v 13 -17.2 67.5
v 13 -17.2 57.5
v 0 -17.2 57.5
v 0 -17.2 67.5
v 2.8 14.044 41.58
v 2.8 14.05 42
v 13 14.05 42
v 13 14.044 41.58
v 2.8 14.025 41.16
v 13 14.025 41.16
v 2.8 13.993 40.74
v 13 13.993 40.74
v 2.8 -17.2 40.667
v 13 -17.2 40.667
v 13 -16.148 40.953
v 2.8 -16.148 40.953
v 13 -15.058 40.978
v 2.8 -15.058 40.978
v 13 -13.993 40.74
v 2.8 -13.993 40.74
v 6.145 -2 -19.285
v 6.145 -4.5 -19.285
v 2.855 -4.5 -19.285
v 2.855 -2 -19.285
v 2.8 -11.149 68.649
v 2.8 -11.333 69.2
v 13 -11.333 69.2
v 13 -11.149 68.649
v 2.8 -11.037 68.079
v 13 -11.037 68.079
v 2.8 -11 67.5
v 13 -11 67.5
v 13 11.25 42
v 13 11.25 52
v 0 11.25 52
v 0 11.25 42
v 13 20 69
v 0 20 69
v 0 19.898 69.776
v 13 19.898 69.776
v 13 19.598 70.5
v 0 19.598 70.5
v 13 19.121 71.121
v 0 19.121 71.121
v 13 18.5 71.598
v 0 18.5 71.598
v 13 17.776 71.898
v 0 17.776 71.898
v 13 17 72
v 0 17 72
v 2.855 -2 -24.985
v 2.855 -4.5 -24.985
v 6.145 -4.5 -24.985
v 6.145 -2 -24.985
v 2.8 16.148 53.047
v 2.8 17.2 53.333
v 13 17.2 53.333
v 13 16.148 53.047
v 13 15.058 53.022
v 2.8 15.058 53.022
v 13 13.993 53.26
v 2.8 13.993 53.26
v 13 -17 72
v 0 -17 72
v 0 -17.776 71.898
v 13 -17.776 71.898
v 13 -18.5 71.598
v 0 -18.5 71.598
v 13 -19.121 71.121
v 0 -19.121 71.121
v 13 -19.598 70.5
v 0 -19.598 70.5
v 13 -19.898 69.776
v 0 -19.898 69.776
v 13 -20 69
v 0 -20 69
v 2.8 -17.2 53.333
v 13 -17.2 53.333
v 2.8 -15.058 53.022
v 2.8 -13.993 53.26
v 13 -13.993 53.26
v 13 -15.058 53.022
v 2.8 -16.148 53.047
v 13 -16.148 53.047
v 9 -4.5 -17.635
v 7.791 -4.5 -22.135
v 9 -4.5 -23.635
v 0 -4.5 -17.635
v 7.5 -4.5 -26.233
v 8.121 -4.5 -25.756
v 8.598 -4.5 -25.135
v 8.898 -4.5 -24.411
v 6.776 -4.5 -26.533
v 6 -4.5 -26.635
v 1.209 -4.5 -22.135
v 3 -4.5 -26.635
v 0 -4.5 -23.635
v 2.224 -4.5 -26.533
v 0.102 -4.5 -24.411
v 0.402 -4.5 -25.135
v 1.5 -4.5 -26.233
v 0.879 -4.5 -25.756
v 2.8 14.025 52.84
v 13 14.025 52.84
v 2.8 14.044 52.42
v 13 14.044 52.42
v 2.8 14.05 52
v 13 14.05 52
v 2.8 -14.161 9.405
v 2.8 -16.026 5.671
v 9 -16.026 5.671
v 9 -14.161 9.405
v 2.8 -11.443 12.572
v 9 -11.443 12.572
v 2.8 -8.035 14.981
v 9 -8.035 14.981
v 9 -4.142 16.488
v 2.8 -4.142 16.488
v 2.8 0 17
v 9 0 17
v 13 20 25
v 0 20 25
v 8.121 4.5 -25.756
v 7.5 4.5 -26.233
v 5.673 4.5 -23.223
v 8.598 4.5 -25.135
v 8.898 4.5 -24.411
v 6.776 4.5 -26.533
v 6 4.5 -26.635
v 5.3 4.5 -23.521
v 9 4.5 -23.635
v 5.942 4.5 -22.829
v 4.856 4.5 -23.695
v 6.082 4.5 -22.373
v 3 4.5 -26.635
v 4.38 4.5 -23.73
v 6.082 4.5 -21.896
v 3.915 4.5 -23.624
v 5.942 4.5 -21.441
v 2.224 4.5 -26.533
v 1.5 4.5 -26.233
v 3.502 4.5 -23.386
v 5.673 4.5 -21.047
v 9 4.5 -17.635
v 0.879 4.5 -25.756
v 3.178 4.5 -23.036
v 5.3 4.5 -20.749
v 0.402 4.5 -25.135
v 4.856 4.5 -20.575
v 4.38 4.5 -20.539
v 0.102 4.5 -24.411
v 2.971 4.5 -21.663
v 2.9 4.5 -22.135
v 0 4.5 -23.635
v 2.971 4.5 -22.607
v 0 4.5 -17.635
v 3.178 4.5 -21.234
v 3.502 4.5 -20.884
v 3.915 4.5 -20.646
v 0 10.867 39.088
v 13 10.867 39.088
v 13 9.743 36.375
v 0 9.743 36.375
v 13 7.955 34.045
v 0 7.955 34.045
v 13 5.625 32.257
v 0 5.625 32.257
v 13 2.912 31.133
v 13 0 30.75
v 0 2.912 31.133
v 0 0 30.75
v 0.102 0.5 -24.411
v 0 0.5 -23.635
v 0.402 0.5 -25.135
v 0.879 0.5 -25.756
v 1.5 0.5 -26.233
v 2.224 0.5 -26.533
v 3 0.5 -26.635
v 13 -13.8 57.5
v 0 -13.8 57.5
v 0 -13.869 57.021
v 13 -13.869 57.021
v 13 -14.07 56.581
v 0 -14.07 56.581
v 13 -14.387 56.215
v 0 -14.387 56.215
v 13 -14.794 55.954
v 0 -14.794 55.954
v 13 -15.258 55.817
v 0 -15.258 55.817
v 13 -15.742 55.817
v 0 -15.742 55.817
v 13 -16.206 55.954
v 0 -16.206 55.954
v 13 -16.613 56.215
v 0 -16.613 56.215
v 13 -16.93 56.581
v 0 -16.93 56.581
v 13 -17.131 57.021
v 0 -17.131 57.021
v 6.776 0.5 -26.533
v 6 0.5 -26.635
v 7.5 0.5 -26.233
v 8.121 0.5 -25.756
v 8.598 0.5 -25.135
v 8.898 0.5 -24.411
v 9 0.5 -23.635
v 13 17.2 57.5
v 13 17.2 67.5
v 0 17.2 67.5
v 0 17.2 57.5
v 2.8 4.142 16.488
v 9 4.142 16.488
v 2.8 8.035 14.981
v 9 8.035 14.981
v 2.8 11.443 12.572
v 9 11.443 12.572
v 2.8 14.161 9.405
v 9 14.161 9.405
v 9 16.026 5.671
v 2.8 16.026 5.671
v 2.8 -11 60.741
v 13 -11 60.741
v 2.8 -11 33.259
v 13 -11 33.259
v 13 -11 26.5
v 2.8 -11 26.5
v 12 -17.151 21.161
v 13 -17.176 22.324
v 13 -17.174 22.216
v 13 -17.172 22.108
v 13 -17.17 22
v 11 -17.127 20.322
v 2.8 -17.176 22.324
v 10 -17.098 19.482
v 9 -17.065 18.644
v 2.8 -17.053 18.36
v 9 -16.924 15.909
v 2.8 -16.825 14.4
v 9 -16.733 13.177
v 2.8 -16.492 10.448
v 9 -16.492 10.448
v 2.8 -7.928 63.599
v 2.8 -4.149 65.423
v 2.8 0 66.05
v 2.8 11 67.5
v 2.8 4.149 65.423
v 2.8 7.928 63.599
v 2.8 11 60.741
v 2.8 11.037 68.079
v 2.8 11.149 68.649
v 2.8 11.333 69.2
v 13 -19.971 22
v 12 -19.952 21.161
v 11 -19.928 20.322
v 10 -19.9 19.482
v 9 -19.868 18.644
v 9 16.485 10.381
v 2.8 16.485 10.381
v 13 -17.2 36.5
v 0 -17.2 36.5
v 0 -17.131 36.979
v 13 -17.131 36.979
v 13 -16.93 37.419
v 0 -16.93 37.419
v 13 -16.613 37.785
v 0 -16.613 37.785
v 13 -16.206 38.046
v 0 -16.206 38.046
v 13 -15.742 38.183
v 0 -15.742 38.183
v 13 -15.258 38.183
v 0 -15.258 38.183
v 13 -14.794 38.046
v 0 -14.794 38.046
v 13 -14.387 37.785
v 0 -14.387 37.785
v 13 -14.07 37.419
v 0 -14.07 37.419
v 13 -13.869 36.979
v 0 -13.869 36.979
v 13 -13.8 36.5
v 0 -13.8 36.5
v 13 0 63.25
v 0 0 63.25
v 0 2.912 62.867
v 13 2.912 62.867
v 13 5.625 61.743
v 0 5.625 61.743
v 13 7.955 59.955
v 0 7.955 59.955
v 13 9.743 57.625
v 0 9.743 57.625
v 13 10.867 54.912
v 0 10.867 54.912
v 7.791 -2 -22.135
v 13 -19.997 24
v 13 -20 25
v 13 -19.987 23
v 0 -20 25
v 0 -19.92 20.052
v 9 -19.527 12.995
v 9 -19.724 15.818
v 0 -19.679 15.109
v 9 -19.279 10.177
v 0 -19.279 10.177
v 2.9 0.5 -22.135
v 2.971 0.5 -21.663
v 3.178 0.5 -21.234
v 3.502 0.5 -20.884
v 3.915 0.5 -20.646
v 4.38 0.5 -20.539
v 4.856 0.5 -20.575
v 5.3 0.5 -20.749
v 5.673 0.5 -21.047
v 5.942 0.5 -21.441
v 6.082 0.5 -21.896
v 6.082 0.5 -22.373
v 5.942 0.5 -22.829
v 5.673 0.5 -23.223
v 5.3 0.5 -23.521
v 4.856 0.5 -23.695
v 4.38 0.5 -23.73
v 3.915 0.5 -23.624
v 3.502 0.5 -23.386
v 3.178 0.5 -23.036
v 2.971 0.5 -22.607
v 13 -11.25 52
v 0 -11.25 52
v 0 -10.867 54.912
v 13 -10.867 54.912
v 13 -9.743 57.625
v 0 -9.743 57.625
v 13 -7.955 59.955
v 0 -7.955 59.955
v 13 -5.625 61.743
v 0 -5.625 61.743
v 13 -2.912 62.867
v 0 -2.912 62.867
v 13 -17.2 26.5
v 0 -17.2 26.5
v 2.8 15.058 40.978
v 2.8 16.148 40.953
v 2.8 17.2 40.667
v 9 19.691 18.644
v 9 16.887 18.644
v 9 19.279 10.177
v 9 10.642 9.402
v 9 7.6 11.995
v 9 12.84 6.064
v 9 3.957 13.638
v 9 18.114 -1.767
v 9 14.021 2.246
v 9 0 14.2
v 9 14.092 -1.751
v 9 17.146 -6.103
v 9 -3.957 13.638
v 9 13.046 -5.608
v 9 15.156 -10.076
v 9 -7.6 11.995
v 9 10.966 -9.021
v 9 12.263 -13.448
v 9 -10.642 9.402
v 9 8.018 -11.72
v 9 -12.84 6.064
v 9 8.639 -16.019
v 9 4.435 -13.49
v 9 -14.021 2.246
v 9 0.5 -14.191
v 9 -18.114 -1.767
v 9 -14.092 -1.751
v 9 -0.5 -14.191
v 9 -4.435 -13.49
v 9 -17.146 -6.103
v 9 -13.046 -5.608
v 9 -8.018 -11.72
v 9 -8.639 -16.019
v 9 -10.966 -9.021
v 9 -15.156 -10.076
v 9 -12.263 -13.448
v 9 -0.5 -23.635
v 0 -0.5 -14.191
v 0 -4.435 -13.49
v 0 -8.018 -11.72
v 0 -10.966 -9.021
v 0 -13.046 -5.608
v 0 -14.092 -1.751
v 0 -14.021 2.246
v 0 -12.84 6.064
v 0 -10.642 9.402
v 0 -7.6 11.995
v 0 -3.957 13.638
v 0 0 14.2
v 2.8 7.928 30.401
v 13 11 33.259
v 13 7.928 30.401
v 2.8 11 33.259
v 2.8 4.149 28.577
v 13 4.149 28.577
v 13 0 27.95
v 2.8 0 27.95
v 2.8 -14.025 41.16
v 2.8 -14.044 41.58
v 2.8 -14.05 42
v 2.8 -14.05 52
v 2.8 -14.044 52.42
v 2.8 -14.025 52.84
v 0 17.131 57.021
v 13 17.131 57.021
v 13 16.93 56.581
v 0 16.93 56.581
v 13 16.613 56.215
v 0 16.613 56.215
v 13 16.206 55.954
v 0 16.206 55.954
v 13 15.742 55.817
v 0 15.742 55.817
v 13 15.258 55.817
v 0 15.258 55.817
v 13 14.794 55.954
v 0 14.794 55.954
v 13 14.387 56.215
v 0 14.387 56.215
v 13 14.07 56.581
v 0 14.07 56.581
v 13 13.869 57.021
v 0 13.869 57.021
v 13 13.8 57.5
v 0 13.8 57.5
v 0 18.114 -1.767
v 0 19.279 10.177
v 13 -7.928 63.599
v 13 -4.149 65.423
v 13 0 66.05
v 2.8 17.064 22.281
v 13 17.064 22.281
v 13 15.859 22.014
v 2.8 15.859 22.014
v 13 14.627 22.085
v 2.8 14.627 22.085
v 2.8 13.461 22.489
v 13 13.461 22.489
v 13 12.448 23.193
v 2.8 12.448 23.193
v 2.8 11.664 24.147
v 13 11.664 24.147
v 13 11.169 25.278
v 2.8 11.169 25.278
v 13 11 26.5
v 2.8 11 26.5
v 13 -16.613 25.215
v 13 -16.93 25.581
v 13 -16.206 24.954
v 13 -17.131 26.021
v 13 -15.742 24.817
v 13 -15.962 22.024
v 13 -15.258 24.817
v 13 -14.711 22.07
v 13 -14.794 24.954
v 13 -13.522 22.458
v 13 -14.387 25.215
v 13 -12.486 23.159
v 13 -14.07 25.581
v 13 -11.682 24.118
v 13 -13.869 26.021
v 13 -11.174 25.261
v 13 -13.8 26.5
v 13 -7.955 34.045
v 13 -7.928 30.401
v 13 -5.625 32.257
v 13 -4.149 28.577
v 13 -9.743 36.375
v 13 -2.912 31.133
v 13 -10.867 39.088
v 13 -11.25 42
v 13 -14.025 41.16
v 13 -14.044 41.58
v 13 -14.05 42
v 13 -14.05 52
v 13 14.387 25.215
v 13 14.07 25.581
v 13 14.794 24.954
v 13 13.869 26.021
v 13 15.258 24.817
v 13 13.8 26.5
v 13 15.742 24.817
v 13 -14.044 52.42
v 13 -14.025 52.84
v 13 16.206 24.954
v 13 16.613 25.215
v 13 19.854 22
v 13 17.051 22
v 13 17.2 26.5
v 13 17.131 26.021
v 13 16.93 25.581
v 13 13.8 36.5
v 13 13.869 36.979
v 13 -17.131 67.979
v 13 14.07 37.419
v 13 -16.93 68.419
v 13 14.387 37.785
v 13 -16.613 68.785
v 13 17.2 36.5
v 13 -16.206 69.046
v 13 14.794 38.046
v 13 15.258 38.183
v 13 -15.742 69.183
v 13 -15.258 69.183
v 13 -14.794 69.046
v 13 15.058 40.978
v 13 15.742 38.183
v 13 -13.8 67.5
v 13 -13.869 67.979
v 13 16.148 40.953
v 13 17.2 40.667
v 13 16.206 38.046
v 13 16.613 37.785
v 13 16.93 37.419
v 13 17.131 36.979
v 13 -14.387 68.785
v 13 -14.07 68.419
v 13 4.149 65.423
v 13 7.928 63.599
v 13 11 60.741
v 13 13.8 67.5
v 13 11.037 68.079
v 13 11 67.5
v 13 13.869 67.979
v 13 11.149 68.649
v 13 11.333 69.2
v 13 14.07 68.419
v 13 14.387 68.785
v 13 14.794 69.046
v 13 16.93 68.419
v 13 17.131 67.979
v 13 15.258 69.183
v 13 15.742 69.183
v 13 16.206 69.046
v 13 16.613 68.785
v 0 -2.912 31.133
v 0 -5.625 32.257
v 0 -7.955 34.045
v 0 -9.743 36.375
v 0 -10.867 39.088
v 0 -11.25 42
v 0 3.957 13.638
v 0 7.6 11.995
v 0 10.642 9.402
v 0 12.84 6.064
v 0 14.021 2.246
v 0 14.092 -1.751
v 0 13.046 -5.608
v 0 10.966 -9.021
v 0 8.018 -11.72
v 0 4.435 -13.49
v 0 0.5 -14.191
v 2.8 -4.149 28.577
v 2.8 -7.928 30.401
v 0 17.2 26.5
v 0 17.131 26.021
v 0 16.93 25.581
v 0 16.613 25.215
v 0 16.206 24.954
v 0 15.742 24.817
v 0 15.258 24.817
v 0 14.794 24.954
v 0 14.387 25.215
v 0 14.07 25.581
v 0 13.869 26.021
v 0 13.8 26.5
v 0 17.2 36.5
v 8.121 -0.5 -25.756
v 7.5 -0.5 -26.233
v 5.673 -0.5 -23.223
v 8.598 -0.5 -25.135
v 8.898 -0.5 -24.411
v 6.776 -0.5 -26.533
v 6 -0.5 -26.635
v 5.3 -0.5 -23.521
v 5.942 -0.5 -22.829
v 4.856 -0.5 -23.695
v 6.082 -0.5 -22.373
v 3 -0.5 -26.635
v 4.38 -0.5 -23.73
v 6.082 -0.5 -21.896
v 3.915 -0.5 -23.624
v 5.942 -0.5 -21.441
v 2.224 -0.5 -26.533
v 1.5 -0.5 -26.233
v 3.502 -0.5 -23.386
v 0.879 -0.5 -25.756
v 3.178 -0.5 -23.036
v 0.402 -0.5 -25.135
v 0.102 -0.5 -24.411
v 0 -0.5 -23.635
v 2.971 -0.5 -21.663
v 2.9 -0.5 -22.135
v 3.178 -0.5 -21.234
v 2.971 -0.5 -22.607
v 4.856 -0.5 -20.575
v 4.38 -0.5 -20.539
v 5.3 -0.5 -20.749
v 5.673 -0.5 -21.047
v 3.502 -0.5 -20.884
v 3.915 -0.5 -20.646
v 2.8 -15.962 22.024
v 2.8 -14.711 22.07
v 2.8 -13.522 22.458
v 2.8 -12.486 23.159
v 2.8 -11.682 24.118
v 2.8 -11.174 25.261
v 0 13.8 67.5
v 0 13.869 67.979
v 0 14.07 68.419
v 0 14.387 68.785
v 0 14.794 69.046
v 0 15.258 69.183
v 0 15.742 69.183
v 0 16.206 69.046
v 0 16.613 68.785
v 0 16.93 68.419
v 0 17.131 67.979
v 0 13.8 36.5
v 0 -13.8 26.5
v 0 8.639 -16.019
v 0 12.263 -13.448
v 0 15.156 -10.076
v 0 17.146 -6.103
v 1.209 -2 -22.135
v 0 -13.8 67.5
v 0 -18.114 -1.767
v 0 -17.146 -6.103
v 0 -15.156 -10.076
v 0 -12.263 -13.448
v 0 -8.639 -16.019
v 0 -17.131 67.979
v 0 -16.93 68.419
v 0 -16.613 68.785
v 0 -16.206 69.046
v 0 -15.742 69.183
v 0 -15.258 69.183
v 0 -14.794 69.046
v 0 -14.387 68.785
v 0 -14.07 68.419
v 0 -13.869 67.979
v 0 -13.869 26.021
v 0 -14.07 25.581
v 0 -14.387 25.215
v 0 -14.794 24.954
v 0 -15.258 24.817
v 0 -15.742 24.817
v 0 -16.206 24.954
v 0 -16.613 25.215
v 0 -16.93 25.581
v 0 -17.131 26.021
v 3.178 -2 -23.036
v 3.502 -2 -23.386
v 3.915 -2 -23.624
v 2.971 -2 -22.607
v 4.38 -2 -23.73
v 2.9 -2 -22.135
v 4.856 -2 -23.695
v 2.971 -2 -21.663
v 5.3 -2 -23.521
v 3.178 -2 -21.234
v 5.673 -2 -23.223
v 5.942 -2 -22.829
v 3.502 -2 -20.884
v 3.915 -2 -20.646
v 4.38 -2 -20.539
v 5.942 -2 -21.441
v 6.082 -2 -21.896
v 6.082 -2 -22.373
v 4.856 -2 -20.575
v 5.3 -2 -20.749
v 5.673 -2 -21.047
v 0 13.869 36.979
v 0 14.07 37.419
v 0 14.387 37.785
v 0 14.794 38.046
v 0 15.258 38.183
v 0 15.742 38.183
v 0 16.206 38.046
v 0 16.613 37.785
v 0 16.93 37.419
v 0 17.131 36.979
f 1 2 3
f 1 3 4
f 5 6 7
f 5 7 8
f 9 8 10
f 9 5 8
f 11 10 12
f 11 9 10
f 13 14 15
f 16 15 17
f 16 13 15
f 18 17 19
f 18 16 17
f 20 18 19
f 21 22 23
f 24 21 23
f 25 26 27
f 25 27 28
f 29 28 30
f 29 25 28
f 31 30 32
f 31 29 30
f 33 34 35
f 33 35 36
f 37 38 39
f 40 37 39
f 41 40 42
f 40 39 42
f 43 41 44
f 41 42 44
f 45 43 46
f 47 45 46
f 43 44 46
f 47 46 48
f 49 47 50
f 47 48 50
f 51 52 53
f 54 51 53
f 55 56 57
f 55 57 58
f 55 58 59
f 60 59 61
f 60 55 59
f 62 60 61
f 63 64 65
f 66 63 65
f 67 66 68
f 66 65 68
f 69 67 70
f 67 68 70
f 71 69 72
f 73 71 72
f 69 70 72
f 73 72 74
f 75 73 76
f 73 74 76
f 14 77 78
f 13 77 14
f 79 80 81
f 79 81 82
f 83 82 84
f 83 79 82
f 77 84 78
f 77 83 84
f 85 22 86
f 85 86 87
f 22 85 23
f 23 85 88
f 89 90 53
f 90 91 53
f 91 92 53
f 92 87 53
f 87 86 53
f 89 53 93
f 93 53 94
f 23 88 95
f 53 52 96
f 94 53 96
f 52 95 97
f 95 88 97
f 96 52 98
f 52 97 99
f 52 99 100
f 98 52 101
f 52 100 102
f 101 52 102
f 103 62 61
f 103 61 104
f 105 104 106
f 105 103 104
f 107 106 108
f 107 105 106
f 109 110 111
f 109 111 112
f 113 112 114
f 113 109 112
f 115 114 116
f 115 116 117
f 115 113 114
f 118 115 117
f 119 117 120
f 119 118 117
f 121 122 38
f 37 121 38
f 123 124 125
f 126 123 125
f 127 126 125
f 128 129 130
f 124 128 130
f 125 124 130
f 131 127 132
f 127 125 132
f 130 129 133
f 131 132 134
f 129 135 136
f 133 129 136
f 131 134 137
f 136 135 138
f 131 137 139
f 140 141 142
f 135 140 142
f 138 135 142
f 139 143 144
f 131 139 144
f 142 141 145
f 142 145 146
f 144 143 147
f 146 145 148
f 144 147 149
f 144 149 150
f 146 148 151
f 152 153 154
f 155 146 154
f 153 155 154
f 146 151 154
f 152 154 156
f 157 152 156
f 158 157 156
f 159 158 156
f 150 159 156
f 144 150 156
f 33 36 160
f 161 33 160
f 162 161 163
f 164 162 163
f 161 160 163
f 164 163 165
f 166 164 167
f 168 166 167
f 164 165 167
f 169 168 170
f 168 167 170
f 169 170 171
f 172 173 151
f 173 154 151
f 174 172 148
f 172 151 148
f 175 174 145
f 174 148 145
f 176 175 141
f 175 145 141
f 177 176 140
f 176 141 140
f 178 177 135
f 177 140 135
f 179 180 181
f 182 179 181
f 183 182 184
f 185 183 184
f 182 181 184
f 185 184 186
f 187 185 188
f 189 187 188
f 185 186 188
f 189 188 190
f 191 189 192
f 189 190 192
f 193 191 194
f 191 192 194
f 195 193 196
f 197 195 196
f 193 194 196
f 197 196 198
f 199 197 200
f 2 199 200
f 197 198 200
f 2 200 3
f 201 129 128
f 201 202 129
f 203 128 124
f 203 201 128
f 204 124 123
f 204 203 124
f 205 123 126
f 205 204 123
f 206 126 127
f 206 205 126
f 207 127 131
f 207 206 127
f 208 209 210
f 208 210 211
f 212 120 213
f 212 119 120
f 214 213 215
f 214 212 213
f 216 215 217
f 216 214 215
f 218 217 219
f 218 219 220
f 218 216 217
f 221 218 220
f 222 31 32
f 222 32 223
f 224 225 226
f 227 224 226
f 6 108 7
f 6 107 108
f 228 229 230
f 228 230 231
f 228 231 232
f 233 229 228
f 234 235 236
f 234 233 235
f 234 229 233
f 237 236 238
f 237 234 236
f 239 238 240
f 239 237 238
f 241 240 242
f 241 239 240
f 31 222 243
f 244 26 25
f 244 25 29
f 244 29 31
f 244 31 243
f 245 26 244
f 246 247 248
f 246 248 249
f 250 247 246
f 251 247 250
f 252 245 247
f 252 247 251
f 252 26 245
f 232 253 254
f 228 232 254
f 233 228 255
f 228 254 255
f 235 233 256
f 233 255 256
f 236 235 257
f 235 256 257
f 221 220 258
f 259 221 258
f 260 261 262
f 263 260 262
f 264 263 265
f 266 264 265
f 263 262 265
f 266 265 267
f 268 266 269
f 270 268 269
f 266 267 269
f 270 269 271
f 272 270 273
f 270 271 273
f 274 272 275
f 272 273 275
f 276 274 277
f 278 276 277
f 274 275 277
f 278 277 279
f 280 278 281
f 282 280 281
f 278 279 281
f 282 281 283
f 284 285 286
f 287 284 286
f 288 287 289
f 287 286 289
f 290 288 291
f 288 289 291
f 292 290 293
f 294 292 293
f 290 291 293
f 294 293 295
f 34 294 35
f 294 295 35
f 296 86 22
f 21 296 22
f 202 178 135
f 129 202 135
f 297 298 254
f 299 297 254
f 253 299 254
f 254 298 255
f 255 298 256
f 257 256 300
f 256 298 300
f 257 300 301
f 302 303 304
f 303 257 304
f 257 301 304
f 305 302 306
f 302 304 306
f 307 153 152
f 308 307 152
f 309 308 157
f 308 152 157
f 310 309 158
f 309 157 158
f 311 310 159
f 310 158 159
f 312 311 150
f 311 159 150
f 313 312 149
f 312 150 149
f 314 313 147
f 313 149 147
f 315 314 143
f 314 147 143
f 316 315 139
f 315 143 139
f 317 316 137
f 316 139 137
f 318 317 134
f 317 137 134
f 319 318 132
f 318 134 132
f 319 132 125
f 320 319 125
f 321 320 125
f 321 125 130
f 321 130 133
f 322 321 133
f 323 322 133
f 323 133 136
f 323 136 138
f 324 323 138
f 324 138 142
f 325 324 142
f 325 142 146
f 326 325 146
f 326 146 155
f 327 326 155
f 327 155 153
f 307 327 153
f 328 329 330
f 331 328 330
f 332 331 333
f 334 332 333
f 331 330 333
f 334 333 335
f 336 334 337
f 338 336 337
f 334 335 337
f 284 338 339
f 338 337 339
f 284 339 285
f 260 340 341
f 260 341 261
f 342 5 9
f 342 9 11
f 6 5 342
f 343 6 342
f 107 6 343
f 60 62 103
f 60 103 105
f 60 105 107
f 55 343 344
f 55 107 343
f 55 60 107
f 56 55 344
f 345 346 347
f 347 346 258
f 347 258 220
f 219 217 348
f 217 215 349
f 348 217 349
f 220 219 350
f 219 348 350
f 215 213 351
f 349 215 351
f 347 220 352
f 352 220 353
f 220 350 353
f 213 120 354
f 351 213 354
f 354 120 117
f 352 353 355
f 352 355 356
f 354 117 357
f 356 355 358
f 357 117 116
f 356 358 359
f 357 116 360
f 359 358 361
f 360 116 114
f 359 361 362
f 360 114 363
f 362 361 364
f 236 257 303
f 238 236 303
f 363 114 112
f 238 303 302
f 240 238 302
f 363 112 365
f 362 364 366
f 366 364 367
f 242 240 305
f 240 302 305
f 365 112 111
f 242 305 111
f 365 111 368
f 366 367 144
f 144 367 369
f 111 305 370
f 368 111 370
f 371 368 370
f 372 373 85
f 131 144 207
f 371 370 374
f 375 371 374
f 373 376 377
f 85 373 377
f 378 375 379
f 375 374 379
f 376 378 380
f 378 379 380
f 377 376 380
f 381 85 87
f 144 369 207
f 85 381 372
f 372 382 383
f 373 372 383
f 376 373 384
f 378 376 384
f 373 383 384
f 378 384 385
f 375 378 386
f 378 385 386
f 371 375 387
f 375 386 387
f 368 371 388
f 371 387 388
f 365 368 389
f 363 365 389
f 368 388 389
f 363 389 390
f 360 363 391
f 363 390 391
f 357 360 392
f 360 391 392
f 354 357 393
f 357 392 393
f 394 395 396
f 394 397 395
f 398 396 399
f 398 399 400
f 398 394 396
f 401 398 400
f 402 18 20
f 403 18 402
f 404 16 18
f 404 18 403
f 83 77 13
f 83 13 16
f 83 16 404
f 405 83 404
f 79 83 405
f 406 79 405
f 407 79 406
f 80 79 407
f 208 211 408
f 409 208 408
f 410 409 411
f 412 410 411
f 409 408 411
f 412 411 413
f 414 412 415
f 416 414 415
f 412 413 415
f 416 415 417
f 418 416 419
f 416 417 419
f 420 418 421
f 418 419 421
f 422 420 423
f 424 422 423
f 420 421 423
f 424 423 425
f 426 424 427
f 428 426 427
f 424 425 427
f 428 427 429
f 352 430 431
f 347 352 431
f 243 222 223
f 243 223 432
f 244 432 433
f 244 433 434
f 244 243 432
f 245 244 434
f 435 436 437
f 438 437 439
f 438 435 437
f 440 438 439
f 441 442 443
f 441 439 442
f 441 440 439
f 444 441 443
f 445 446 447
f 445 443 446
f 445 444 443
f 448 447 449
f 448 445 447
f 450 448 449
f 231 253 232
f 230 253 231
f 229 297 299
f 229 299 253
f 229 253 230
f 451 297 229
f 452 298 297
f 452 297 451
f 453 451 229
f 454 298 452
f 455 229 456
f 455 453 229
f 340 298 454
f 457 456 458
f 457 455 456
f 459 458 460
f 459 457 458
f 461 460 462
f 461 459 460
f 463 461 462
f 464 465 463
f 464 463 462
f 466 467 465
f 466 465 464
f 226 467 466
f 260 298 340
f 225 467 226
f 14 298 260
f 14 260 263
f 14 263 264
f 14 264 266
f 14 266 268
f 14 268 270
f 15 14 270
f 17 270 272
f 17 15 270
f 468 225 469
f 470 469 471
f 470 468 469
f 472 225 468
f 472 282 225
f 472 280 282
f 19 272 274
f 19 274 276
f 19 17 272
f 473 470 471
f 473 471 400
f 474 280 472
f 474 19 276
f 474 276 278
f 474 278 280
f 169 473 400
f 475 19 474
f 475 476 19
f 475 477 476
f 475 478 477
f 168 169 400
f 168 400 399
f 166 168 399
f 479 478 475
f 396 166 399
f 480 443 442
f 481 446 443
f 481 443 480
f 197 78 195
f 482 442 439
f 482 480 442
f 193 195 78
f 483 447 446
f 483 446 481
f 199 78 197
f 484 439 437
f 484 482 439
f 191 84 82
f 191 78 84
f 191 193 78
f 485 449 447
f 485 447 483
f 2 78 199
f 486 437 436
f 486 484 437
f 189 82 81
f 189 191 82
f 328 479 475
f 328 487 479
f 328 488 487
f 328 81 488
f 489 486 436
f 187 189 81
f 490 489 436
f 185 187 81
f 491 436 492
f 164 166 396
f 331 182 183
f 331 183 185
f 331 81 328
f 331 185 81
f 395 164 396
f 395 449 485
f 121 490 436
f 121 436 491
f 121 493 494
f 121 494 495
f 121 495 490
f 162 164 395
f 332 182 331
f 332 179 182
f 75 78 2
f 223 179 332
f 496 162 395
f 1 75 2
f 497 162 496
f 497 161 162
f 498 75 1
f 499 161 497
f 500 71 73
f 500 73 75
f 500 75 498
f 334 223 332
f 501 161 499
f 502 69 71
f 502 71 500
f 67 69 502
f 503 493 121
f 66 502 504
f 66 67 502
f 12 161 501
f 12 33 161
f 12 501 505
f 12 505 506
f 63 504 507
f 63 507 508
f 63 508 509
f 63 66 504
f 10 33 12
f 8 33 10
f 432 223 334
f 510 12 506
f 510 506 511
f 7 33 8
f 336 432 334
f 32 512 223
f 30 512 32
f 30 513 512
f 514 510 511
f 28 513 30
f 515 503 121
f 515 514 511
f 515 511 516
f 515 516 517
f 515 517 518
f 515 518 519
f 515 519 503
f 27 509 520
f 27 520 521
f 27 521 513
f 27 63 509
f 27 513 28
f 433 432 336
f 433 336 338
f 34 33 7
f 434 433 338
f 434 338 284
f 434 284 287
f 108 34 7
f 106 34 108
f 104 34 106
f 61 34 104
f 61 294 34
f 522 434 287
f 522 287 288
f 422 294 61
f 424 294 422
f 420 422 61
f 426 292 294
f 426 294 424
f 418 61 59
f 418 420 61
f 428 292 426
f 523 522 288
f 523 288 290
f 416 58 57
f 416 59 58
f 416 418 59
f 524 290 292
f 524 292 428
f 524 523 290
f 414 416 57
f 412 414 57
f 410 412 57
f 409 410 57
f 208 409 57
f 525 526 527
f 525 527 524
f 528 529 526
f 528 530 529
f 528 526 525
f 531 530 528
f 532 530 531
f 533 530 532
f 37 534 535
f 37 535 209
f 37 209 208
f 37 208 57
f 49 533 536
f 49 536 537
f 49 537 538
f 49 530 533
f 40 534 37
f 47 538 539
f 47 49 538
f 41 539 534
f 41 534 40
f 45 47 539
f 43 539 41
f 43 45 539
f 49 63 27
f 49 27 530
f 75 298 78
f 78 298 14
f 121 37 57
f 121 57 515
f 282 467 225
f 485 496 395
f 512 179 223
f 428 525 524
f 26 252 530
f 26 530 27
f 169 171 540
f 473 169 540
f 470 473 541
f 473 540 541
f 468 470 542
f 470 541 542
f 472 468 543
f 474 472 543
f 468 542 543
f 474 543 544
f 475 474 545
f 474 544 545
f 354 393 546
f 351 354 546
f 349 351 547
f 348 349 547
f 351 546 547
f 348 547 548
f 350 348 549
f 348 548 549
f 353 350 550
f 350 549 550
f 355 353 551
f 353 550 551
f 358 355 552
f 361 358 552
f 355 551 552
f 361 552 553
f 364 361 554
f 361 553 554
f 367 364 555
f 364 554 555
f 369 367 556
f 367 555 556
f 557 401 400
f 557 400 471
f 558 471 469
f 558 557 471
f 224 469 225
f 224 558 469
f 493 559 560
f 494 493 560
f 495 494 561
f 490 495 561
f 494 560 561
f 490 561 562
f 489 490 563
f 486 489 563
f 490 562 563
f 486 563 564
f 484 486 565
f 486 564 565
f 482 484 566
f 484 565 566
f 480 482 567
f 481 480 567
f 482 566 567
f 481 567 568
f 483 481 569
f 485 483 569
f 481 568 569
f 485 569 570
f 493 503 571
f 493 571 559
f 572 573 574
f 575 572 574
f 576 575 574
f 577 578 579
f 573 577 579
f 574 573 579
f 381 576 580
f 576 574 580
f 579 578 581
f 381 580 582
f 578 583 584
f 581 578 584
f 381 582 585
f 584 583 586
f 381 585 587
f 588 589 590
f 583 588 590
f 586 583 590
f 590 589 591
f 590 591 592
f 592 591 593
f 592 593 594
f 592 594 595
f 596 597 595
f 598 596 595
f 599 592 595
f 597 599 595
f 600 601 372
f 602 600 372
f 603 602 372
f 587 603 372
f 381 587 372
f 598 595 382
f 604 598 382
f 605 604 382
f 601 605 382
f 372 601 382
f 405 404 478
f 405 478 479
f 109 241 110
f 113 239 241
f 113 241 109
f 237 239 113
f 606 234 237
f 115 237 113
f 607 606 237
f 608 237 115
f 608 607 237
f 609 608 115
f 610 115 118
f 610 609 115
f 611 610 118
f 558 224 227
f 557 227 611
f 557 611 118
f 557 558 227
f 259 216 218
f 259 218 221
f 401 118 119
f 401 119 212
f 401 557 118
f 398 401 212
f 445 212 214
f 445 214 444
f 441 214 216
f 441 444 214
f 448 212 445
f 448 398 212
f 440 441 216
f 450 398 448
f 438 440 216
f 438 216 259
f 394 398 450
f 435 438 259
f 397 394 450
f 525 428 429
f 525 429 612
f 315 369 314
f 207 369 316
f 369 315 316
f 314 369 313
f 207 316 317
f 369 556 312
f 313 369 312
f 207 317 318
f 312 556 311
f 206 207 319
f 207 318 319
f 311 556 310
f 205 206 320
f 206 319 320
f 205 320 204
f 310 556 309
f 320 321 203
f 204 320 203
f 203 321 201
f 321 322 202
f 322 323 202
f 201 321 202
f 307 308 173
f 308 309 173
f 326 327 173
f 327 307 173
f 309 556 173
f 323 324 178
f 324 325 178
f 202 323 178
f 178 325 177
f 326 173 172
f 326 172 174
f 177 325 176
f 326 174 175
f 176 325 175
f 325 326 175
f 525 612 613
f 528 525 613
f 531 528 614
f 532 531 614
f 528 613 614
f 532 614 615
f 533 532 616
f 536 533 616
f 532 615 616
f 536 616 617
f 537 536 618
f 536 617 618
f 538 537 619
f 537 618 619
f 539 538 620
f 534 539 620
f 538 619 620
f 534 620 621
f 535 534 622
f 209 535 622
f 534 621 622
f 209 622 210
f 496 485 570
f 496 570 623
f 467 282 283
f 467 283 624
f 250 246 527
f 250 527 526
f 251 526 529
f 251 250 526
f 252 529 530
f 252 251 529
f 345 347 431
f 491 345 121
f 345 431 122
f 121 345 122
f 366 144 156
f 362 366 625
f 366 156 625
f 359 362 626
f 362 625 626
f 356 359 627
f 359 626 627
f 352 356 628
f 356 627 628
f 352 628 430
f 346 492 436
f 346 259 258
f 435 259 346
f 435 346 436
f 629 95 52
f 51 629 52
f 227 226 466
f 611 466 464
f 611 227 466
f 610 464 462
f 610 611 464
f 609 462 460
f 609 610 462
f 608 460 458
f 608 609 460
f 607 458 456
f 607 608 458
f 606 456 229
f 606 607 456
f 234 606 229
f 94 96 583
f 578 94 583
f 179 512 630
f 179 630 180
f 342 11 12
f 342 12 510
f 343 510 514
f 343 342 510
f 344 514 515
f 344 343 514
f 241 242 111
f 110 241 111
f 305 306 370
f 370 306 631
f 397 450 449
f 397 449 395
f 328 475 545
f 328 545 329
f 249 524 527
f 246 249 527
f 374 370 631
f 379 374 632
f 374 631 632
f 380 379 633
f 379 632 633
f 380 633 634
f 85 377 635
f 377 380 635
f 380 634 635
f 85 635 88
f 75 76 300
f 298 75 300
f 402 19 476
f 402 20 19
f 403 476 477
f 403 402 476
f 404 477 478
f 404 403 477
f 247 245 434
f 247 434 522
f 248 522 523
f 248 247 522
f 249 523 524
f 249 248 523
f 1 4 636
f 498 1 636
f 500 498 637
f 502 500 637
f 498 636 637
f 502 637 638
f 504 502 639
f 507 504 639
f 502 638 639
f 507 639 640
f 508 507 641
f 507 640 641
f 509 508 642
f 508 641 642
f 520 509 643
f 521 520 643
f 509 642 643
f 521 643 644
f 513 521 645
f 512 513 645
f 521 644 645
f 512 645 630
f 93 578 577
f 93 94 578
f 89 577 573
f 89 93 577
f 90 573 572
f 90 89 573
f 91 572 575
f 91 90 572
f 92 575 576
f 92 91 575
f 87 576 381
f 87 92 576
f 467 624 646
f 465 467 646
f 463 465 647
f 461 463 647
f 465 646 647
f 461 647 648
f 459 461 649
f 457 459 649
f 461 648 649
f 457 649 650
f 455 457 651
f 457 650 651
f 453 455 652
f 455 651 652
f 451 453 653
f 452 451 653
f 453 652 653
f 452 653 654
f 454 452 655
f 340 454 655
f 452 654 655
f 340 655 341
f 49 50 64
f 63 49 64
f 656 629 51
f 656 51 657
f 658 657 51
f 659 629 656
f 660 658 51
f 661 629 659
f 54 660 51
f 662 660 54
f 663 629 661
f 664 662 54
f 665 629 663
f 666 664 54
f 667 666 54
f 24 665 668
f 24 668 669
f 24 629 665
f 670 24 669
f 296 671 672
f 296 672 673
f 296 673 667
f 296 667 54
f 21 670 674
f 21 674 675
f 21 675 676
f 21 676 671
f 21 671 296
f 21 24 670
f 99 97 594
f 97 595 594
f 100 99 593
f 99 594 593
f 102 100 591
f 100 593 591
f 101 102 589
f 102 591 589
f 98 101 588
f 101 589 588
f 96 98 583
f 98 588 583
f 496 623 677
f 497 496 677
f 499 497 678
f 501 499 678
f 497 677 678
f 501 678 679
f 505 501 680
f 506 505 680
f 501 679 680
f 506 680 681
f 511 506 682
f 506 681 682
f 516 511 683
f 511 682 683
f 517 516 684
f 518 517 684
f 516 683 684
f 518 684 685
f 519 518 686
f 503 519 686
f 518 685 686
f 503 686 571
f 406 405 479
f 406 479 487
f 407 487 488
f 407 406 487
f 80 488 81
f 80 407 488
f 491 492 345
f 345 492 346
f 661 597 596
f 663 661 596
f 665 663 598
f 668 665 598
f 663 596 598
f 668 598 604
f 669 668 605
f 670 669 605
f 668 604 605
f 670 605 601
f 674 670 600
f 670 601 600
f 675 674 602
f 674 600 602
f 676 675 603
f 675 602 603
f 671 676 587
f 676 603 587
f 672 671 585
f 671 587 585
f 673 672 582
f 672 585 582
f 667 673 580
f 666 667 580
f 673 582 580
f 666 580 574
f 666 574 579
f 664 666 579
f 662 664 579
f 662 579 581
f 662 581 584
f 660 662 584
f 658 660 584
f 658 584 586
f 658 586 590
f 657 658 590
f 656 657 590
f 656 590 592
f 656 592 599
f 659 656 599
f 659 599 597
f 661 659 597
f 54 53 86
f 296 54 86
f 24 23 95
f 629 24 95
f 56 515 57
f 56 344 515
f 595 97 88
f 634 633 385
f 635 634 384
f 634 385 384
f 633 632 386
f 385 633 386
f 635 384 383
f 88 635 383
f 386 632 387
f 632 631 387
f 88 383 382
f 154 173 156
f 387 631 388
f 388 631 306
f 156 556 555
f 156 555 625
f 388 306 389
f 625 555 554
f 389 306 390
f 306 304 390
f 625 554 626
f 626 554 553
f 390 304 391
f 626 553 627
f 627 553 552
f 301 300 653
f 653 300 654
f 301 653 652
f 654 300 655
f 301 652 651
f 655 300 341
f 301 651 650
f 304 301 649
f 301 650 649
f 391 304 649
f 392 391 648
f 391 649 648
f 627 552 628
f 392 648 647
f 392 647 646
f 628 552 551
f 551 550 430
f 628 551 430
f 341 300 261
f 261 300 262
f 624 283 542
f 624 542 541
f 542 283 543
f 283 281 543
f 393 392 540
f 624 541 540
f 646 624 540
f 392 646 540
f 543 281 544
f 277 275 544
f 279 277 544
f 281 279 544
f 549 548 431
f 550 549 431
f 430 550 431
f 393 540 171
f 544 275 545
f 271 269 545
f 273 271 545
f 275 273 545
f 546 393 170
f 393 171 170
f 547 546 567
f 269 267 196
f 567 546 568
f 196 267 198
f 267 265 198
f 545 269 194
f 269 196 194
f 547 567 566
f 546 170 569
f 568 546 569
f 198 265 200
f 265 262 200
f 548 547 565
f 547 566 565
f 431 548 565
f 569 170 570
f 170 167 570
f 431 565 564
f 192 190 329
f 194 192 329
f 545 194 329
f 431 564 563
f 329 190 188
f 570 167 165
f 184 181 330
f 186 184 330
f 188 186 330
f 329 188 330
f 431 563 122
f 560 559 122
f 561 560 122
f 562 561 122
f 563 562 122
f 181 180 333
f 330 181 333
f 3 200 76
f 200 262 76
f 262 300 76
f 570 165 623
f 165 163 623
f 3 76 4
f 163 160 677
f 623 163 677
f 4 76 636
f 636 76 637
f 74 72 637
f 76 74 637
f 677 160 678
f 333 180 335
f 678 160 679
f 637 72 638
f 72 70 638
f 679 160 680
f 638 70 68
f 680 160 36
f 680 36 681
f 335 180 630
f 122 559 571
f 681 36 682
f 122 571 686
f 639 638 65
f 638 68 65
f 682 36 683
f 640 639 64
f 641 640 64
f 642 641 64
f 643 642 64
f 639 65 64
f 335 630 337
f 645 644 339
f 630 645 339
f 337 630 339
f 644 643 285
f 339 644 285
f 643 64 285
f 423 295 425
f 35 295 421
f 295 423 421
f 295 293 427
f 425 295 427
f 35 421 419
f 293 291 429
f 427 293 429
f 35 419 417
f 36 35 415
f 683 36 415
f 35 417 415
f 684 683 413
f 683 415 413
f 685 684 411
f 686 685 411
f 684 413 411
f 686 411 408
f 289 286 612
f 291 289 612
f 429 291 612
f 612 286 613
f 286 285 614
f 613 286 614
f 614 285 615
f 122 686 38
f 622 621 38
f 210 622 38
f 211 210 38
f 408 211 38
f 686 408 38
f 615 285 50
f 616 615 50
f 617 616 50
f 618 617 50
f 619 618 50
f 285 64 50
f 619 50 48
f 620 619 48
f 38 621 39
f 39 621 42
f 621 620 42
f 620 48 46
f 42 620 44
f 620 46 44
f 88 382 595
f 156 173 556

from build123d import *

# Parameters (mm, degrees)
F1_DEPTH = 13
F3_D     = 3.2
F4_T     = -2.8
F6_DEPTH = 40.001
F7_DEPTH = 2.5
F8_R     = 3


with BuildPart() as f1:
    # F0 (on Right) → F1 (new body)
    with BuildSketch(Plane.YZ):
        with BuildLine():
            ThreePointArc((-17, 72), (-19.1213203436, 71.1213203436), (-20, 69))
            Line((-20, 69), (-20, 25))
            ThreePointArc((-20, 25), (-19.8196101249, 17.5795865345), (-19.2788666706, 10.1767037836))
            Line((-19.2788666706, 10.1767037836), (-18.1140558503, -1.7666297441))
            ThreePointArc((-18.1140558503, -1.7666297441), (-13.8130173627, -11.8507616353), (-4.5, -17.6349085623))
            Line((-4.5, -17.6349085623), (-4.5, -26.6349085623))
            Line((-4.5, -26.6349085623), (-0.5, -26.6349085623))
            Line((-0.5, -26.6349085623), (-0.5, -14.1911944529))
            ThreePointArc((-0.5, -14.1911944529), (-14.1977984426, 0.2500387658), (0, 14.2))
            ThreePointArc((0, 14.2), (14.1977984426, 0.2500387658), (0.5, -14.1911944529))
            Line((0.5, -14.1911944529), (0.5, -26.6349085623))
            Line((0.5, -26.6349085623), (4.5, -26.6349085623))
            Line((4.5, -26.6349085623), (4.5, -17.6349085623))
            ThreePointArc((4.5, -17.6349085623), (13.8130173627, -11.8507616353), (18.1140558503, -1.7666297441))
            Line((18.1140558503, -1.7666297441), (19.2788666706, 10.1767037836))
            Line((19.2788666706, 10.1767037836), (20, 25))
            Line((20, 25), (20, 69))
            ThreePointArc((20, 69), (19.1213203436, 71.1213203436), (17, 72))
            Line((17, 72), (0, 72))
            Line((0, 72), (-17, 72))
        make_face()
        with BuildLine():
            Line((-17.2, 26.5), (-17.2, 36.5))
            ThreePointArc((-17.2, 36.5), (-15.5, 38.2), (-13.8, 36.5))
            Line((-13.8, 36.5), (-13.8, 26.5))
            ThreePointArc((-13.8, 26.5), (-15.5, 24.8), (-17.2, 26.5))
        make_face(mode=Mode.SUBTRACT)
        with BuildLine():
            Line((-17.2, 57.5), (-17.2, 67.5))
            ThreePointArc((-17.2, 67.5), (-15.5, 69.2), (-13.8, 67.5))
            Line((-13.8, 67.5), (-13.8, 57.5))
            ThreePointArc((-13.8, 57.5), (-15.5, 55.8), (-17.2, 57.5))
        make_face(mode=Mode.SUBTRACT)
        with BuildLine():
            ThreePointArc((-11.25, 52), (-7.9549512883, 59.9549512883), (0, 63.25))
            ThreePointArc((0, 63.25), (7.9549512883, 59.9549512883), (11.25, 52))
            Line((11.25, 52), (11.25, 42))
            ThreePointArc((11.25, 42), (7.9549512883, 34.0450487117), (0, 30.75))
            ThreePointArc((0, 30.75), (-7.9549512883, 34.0450487117), (-11.25, 42))
            Line((-11.25, 42), (-11.25, 52))
        make_face(mode=Mode.SUBTRACT)
        with BuildLine():
            ThreePointArc((17.2, 26.5), (15.5, 24.8), (13.8, 26.5))
            Line((13.8, 26.5), (13.8, 36.5))
            ThreePointArc((13.8, 36.5), (15.5, 38.2), (17.2, 36.5))
            Line((17.2, 36.5), (17.2, 26.5))
        make_face(mode=Mode.SUBTRACT)
        with BuildLine():
            Line((17.2, 67.5), (17.2, 57.5))
            ThreePointArc((17.2, 57.5), (15.5, 55.8), (13.8, 57.5))
            Line((13.8, 57.5), (13.8, 67.5))
            ThreePointArc((13.8, 67.5), (15.5, 69.2), (17.2, 67.5))
        make_face(mode=Mode.SUBTRACT)
    extrude(amount=F1_DEPTH)

    # F3 (through all)
    with Locations(Plane.XZ.offset(4.5)):
        with Locations((4.5, -22.1349085623)):
            Hole(F3_D / 2)

    # F4
    f4_openings = [f1.faces().sort_by_distance(p)[0] for p in [
        (13, -0.017595, 30.158795),
    ]]
    offset(amount=F4_T, openings=f4_openings)

    # F5 (on face) → F6 (cut, through all)
    with BuildSketch(Plane.XZ.offset(20)):
        Polygon((13, -28), (13, 22), (9, 18.6436014753), (9, -28), align=None)
    extrude(amount=-F6_DEPTH, mode=Mode.SUBTRACT)

    # F2 (on face) → F7 (cut)
    with BuildSketch(Plane.XZ.offset(4.5)):
        Polygon((6.1454482672, -19.2849085623), (2.8545517328, -19.2849085623), (1.2091034656, -22.1349085623), (4.5, -22.1349085623), (4.5, -24.9849085623), (6.1454482672, -24.9849085623), (7.7908965344, -22.1349085623), align=None)
        Polygon((4.5, -22.1349085623), (1.2091034656, -22.1349085623), (2.8545517328, -24.9849085623), (4.5, -24.9849085623), align=None)
    extrude(amount=-F7_DEPTH, mode=Mode.SUBTRACT)

    # F8
    f8_edges = [f1.edges().sort_by_distance(p)[0] for p in [
        (0, -2.5, -26.634909),
        (0, 2.5, -26.634909),
        (9, -2.5, -26.634909),
        (9, 2.5, -26.634909),
    ]]
    fillet(f8_edges, radius=F8_R)


solid = f1.part
